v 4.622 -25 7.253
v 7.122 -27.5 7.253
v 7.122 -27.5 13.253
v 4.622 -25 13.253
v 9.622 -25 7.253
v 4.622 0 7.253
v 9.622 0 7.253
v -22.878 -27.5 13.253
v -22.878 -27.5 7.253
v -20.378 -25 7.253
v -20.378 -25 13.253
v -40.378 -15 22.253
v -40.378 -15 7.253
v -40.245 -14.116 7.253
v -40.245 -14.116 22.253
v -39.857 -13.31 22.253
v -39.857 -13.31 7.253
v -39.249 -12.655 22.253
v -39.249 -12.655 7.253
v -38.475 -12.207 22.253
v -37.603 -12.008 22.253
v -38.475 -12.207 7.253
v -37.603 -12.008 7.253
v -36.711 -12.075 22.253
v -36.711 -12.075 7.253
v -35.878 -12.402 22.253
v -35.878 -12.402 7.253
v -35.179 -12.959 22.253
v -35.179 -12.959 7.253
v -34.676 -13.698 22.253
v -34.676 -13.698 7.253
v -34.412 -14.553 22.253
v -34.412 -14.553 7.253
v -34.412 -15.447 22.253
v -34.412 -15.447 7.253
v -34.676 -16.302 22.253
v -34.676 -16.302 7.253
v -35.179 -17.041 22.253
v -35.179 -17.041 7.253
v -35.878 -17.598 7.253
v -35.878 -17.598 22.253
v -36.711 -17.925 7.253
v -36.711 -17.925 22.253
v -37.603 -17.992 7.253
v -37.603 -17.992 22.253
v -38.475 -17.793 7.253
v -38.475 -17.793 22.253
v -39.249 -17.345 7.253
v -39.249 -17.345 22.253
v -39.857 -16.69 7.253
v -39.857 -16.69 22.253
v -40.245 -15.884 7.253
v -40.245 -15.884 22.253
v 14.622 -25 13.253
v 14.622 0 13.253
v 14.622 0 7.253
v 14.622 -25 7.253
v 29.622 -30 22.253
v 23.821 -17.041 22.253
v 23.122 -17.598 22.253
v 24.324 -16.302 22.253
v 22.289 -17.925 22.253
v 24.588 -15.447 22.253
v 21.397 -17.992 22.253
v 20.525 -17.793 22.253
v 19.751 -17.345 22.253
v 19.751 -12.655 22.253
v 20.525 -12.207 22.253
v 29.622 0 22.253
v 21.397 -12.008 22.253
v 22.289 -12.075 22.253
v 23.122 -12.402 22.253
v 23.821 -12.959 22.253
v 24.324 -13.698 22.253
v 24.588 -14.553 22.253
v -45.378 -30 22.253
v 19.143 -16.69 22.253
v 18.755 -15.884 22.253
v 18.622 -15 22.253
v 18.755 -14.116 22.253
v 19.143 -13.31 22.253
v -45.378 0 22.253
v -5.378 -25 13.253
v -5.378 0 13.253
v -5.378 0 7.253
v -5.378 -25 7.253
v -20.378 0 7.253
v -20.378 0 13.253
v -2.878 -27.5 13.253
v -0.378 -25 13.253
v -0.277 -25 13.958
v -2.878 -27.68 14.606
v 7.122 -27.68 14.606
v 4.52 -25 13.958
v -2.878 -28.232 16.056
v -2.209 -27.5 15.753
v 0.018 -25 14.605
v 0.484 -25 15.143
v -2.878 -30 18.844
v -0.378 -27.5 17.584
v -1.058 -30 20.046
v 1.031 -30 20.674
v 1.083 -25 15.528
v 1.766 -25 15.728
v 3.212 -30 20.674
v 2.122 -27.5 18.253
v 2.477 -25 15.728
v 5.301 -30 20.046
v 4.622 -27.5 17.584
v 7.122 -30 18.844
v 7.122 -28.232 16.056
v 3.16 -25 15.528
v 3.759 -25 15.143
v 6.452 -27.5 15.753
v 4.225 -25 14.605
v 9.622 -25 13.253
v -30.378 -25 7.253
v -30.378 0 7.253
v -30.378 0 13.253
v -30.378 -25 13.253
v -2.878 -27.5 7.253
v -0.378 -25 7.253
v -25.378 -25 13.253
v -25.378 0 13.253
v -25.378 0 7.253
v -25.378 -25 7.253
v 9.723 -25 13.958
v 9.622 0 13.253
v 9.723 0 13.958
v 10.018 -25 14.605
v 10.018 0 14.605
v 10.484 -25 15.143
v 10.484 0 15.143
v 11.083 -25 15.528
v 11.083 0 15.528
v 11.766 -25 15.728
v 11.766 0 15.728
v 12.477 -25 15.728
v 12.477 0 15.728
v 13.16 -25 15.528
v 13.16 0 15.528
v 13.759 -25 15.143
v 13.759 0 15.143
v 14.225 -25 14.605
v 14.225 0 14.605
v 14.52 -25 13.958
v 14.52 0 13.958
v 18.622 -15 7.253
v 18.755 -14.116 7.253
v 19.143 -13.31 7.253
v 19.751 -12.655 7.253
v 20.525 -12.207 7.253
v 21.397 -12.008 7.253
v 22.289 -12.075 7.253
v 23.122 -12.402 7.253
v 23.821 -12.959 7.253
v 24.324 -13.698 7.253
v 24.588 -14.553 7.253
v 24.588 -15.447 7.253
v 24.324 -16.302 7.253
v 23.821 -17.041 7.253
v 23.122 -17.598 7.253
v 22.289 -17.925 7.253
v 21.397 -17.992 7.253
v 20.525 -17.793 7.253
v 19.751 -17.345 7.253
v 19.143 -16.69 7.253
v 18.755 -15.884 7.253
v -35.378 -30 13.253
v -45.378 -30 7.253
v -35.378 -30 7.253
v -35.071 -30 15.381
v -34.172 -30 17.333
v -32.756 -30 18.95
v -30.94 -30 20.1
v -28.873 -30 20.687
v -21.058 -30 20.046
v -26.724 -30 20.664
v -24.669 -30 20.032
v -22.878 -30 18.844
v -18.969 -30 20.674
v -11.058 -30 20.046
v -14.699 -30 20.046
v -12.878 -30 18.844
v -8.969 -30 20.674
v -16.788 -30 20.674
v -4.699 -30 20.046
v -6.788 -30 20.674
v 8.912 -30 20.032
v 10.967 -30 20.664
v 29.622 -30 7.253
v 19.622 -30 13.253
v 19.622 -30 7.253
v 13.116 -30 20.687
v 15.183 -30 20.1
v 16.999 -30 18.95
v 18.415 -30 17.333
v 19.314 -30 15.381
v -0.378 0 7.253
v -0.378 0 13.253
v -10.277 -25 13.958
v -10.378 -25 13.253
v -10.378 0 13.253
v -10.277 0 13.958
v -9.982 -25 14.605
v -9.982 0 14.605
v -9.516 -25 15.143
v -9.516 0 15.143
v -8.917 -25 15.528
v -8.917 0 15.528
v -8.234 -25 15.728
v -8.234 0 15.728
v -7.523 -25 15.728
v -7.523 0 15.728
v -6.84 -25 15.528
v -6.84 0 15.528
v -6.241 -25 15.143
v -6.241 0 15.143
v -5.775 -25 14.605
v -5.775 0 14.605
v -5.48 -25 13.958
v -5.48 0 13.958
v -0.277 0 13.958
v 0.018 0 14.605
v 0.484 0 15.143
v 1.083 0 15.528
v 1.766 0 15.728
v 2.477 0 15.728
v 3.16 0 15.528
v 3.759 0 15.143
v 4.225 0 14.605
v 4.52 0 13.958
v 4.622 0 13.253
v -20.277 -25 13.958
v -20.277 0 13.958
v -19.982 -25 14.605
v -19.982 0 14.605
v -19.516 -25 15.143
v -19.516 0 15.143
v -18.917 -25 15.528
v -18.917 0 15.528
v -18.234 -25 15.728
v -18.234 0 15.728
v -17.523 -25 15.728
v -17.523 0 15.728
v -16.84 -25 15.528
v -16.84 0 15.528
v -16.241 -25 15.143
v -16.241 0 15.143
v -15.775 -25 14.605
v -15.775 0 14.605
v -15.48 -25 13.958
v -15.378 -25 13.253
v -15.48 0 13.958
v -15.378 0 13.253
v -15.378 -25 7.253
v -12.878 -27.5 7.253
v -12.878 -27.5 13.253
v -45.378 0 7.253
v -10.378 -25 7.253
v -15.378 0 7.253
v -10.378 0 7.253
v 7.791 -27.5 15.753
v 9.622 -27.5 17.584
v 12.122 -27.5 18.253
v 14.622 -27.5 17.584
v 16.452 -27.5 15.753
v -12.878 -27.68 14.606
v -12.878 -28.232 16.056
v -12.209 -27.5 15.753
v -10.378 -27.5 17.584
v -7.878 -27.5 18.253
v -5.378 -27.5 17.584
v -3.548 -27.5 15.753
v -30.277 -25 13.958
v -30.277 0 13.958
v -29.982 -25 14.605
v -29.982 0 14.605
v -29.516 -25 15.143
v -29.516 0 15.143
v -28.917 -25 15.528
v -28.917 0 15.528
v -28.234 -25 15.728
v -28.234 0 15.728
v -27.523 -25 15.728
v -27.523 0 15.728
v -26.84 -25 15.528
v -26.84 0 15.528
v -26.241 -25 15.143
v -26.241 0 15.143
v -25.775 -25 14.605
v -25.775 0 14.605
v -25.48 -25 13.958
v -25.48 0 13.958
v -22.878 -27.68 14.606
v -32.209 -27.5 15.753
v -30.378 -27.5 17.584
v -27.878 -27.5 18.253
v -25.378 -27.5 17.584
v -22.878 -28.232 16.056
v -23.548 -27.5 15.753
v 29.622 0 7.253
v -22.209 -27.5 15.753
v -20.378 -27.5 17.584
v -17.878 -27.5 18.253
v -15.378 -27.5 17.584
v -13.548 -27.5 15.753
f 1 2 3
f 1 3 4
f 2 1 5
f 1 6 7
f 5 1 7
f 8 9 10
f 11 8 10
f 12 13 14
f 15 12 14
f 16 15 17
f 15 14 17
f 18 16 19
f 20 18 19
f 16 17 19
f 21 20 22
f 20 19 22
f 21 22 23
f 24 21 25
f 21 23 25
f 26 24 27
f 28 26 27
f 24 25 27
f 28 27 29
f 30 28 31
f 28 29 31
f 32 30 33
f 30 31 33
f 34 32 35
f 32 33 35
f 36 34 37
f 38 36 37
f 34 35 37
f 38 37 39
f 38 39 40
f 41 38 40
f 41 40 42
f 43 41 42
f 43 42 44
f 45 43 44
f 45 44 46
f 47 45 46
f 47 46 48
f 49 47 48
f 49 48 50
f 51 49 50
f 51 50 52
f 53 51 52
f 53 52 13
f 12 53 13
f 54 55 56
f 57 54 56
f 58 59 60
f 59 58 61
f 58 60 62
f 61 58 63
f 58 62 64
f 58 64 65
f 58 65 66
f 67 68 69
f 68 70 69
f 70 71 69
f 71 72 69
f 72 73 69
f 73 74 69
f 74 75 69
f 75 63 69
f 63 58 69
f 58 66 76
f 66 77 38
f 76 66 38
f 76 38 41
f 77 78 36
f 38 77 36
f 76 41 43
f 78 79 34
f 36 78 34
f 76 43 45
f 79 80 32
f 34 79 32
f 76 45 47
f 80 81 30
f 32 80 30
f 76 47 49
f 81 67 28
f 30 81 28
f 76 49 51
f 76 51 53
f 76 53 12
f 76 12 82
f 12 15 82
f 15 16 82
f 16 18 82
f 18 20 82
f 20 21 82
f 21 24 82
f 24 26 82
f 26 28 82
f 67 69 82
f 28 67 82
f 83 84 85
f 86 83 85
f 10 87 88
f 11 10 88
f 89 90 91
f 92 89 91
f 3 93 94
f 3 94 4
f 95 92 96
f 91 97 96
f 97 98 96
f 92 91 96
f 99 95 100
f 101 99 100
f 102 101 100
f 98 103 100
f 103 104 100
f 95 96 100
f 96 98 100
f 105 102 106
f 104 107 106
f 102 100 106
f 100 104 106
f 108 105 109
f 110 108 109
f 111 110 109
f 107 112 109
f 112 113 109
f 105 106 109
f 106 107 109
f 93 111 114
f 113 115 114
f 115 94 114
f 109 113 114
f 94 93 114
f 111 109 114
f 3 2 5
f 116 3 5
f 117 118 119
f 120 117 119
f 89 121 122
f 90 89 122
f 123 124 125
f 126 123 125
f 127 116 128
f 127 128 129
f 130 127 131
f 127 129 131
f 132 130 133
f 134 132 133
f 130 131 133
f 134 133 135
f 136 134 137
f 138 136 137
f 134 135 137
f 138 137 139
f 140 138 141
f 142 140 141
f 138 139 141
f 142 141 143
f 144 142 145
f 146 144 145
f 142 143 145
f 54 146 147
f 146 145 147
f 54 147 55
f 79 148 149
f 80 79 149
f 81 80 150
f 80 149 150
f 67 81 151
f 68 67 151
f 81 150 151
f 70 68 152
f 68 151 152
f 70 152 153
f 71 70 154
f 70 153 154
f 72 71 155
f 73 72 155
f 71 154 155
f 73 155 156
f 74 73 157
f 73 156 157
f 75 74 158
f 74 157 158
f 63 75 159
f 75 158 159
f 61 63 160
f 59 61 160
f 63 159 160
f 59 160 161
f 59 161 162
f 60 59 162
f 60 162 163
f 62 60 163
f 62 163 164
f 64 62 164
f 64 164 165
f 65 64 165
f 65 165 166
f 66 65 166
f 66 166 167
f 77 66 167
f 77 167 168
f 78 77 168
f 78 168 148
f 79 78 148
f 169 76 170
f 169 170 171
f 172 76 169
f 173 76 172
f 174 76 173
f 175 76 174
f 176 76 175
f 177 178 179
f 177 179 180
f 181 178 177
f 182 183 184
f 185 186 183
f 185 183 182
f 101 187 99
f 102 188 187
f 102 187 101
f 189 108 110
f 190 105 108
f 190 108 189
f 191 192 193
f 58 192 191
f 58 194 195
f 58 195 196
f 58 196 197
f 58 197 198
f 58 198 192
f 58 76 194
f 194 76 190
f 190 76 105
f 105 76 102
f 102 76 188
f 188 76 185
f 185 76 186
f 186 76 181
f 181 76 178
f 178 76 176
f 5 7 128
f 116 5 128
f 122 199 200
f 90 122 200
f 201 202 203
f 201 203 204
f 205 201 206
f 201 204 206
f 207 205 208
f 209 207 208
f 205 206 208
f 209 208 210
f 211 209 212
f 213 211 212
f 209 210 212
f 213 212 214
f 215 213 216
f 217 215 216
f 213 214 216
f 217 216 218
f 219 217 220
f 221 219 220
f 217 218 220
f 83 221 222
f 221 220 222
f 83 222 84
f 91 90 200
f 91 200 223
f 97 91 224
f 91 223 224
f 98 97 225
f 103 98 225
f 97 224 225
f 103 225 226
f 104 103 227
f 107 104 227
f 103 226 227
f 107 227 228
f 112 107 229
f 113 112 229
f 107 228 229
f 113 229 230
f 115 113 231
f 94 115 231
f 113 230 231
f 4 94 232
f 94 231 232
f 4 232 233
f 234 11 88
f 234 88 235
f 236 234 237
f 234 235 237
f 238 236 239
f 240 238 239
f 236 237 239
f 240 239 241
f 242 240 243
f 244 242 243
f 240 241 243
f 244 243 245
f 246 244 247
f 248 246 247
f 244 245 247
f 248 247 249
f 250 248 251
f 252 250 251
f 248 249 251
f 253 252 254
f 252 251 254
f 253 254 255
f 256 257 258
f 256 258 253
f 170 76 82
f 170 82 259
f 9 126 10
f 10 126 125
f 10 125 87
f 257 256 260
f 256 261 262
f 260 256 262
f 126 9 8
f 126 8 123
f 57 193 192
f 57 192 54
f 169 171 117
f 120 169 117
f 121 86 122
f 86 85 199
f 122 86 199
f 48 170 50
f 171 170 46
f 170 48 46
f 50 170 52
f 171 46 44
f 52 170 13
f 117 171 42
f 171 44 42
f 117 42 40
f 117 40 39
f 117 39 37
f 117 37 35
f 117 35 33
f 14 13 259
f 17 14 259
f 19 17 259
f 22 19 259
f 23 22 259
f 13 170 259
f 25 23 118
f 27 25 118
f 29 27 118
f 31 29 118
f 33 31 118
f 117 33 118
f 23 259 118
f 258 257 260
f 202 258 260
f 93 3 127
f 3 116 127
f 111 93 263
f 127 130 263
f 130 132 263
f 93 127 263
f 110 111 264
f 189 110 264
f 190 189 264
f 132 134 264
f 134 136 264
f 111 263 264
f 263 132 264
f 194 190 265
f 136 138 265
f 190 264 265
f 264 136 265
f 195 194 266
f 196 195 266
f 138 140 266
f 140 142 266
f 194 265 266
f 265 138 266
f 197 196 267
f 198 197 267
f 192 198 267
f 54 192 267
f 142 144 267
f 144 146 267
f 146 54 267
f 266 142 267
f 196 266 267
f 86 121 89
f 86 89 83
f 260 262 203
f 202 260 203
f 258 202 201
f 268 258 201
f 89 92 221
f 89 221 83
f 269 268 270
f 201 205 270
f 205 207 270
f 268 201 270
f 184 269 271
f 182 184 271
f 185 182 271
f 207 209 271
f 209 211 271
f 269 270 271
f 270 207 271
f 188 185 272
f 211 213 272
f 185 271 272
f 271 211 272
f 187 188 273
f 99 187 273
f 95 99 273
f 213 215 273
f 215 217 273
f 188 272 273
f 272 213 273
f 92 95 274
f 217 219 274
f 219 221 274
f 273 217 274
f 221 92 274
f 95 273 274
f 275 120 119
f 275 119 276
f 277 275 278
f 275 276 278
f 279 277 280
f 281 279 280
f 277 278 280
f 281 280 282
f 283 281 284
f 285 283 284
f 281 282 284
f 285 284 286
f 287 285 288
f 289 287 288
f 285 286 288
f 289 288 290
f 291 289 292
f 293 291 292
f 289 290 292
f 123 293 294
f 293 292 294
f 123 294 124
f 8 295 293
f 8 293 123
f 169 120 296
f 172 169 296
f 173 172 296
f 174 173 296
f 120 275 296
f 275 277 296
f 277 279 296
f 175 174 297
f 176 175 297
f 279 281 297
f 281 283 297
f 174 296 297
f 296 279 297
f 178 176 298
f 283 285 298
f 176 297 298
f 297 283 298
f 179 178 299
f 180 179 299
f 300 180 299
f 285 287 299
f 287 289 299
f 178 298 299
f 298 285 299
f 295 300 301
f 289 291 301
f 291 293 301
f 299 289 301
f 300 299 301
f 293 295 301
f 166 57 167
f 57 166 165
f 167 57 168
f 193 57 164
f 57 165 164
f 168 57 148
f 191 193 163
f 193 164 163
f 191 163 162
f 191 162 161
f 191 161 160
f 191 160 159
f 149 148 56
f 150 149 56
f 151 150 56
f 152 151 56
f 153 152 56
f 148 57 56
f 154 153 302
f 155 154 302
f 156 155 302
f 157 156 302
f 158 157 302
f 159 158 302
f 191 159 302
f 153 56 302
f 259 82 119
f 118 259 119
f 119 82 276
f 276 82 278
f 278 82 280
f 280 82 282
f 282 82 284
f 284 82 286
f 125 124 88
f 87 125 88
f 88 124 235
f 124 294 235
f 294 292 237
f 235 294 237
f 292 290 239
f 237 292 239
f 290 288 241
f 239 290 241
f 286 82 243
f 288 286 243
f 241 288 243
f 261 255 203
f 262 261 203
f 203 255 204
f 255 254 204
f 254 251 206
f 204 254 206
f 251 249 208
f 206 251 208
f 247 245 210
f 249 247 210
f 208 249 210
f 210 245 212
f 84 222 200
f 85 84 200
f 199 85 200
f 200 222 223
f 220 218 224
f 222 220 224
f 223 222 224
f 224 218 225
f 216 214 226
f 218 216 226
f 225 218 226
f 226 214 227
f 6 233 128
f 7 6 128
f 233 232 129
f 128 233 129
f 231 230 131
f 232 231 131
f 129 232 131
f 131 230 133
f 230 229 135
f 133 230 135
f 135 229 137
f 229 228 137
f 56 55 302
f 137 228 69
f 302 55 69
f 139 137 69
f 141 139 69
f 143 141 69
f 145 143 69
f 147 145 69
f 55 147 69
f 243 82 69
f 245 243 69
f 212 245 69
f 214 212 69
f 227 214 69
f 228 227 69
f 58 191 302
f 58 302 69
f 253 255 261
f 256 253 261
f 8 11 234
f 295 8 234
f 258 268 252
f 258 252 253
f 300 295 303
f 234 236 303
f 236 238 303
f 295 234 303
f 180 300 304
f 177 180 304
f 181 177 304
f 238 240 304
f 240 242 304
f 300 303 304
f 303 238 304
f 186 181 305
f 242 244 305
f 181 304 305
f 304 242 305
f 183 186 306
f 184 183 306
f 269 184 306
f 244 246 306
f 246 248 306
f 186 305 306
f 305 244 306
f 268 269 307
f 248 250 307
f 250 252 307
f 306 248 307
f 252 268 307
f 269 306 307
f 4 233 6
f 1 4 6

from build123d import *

# Parameters (mm, degrees)
F1_DEPTH     = 30
F3_D         = 6
F4_T1_DEPTH  = 18.8584149398
F4_T4_ANGLE  = 180
F4_T6_ANGLE  = 180
F4_T8_ANGLE  = 180
F4_T10_ANGLE = 180
F4_T12_ANGLE = 180


# Not quite as in the source:
# - a fillet or chamfer that OpenCascade refuses, or shapes differently, is made with other operations: its cross-section is extruded or revolved along the edge and cut away or added


with BuildPart() as f1:
    # F0 (on Front) → F1 (new body)
    with BuildSketch(Plane.XZ):
        with BuildLine():
            Line((29.6215080619, 22.2534802178), (-45.3784919381, 22.2534802178))
            Line((-45.3784919381, 22.2534802178), (-45.3784919381, 7.2534802178))
            Line((-45.3784919381, 7.2534802178), (-30.3784919381, 7.2534802178))
            Line((-30.3784919381, 7.2534802178), (-30.3784919381, 13.2534802178))
            ThreePointArc((-30.3784919381, 13.2534802178), (-27.8784919381, 15.7534802178), (-25.3784919381, 13.2534802178))
            Line((-25.3784919381, 13.2534802178), (-25.3784919381, 7.2534802178))
            Line((-25.3784919381, 7.2534802178), (-20.3784919381, 7.2534802178))
            Line((-20.3784919381, 7.2534802178), (-20.3784919381, 13.2534802178))
            ThreePointArc((-20.3784919381, 13.2534802178), (-17.8784919381, 15.7534802178), (-15.3784919381, 13.2534802178))
            Line((-15.3784919381, 13.2534802178), (-15.3784919381, 7.2534802178))
            Line((-15.3784919381, 7.2534802178), (-10.3784919381, 7.2534802178))
            Line((-10.3784919381, 7.2534802178), (-10.3784919381, 13.2534802178))
            ThreePointArc((-10.3784919381, 13.2534802178), (-7.8784919381, 15.7534802178), (-5.3784919381, 13.2534802178))
            Line((-5.3784919381, 13.2534802178), (-5.3784919381, 7.2534802178))
            Line((-5.3784919381, 7.2534802178), (-0.3784919381, 7.2534802178))
            Line((-0.3784919381, 7.2534802178), (-0.3784919381, 13.2534802178))
            ThreePointArc((-0.3784919381, 13.2534802178), (2.1215080619, 15.7534802178), (4.6215080619, 13.2534802178))
            Line((4.6215080619, 13.2534802178), (4.6215080619, 7.2534802178))
            Line((4.6215080619, 7.2534802178), (9.6215080619, 7.2534802178))
            Line((9.6215080619, 7.2534802178), (9.6215080619, 13.2534802178))
            ThreePointArc((9.6215080619, 13.2534802178), (12.1215080619, 15.7534802178), (14.6215080619, 13.2534802178))
            Line((14.6215080619, 13.2534802178), (14.6215080619, 7.2534802178))
            Line((14.6215080619, 7.2534802178), (29.6215080619, 7.2534802178))
            Line((29.6215080619, 7.2534802178), (29.6215080619, 22.2534802178))
        make_face()
    extrude(amount=F1_DEPTH)

    # F3 (through all)
    with Locations(Plane.XY.offset(22.2534802178)):
        with Locations((-37.3784919381, -15), (21.6215080619, -15)):
            Hole(F3_D / 2)

    # F4: chamfer of 5 on 5 edges, made by hand

    # F4_s2 → F4_t1 (cut)
    with BuildSketch(Plane.XY.offset(-5.604934722)):
        Polygon((-35.3784919381, -30), (-30.3784919381, -25), (-30.3784919381, -30), align=None)
        Polygon((-25.3784919381, -30), (-20.3784919381, -25), (-20.3784919381, -30), align=None)
        Polygon((-15.3784919381, -30), (-10.3784919381, -25), (-10.3784919381, -30), align=None)
        Polygon((-5.3784919381, -30), (-0.3784919381, -25), (-0.3784919381, -30), align=None)
        Polygon((4.6215080619, -30), (9.6215080619, -25), (9.6215080619, -30), align=None)
        Polygon((19.6215080619, -30), (14.6215080619, -25), (14.6215080619, -30), align=None)
        Polygon((9.6215080619, -30), (4.6215080619, -25), (4.6215080619, -30), align=None)
        Polygon((-0.3784919381, -30), (-5.3784919381, -25), (-5.3784919381, -30), align=None)
        Polygon((-10.3784919381, -30), (-15.3784919381, -25), (-15.3784919381, -30), align=None)
        Polygon((-20.3784919381, -30), (-25.3784919381, -25), (-25.3784919381, -30), align=None)
    extrude(amount=F4_T1_DEPTH, mode=Mode.SUBTRACT)

    # F4_s3 → F4_t4 (revolve, cut)
    with BuildSketch(Plane.XY.offset(13.2534802178)):
        Polygon((4.6215080619, -30), (9.6215080619, -25), (9.6215080619, -30), align=None)
    revolve(axis=Axis((12.1215080619, -30, 13.2534802178), (0, 1, 0)), revolution_arc=F4_T4_ANGLE, mode=Mode.SUBTRACT)

    # F4_s5 → F4_t6 (revolve, cut)
    with BuildSketch(Plane.XY.offset(13.2534802178)):
        Polygon((-5.3784919381, -30), (-0.3784919381, -25), (-0.3784919381, -30), align=None)
    revolve(axis=Axis((2.1215080619, -30, 13.2534802178), (0, 1, 0)), revolution_arc=F4_T6_ANGLE, mode=Mode.SUBTRACT)

    # F4_s7 → F4_t8 (revolve, cut)
    with BuildSketch(Plane.XY.offset(13.2534802178)):
        Polygon((-15.3784919381, -30), (-10.3784919381, -25), (-10.3784919381, -30), align=None)
    revolve(axis=Axis((-7.8784919381, -30, 13.2534802178), (0, 1, 0)), revolution_arc=F4_T8_ANGLE, mode=Mode.SUBTRACT)

    # F4_s9 → F4_t10 (revolve, cut)
    with BuildSketch(Plane.XY.offset(13.2534802178)):
        Polygon((-25.3784919381, -30), (-20.3784919381, -25), (-20.3784919381, -30), align=None)
    revolve(axis=Axis((-17.8784919381, -30, 13.2534802178), (0, 1, 0)), revolution_arc=F4_T10_ANGLE, mode=Mode.SUBTRACT)

    # F4_s11 → F4_t12 (revolve, cut)
    with BuildSketch(Plane.XY.offset(13.2534802178)):
        Polygon((-35.3784919381, -30), (-30.3784919381, -25), (-30.3784919381, -30), align=None)
    revolve(axis=Axis((-27.8784919381, -30, 13.2534802178), (0, 1, 0)), revolution_arc=F4_T12_ANGLE, mode=Mode.SUBTRACT)


solid = f1.part
